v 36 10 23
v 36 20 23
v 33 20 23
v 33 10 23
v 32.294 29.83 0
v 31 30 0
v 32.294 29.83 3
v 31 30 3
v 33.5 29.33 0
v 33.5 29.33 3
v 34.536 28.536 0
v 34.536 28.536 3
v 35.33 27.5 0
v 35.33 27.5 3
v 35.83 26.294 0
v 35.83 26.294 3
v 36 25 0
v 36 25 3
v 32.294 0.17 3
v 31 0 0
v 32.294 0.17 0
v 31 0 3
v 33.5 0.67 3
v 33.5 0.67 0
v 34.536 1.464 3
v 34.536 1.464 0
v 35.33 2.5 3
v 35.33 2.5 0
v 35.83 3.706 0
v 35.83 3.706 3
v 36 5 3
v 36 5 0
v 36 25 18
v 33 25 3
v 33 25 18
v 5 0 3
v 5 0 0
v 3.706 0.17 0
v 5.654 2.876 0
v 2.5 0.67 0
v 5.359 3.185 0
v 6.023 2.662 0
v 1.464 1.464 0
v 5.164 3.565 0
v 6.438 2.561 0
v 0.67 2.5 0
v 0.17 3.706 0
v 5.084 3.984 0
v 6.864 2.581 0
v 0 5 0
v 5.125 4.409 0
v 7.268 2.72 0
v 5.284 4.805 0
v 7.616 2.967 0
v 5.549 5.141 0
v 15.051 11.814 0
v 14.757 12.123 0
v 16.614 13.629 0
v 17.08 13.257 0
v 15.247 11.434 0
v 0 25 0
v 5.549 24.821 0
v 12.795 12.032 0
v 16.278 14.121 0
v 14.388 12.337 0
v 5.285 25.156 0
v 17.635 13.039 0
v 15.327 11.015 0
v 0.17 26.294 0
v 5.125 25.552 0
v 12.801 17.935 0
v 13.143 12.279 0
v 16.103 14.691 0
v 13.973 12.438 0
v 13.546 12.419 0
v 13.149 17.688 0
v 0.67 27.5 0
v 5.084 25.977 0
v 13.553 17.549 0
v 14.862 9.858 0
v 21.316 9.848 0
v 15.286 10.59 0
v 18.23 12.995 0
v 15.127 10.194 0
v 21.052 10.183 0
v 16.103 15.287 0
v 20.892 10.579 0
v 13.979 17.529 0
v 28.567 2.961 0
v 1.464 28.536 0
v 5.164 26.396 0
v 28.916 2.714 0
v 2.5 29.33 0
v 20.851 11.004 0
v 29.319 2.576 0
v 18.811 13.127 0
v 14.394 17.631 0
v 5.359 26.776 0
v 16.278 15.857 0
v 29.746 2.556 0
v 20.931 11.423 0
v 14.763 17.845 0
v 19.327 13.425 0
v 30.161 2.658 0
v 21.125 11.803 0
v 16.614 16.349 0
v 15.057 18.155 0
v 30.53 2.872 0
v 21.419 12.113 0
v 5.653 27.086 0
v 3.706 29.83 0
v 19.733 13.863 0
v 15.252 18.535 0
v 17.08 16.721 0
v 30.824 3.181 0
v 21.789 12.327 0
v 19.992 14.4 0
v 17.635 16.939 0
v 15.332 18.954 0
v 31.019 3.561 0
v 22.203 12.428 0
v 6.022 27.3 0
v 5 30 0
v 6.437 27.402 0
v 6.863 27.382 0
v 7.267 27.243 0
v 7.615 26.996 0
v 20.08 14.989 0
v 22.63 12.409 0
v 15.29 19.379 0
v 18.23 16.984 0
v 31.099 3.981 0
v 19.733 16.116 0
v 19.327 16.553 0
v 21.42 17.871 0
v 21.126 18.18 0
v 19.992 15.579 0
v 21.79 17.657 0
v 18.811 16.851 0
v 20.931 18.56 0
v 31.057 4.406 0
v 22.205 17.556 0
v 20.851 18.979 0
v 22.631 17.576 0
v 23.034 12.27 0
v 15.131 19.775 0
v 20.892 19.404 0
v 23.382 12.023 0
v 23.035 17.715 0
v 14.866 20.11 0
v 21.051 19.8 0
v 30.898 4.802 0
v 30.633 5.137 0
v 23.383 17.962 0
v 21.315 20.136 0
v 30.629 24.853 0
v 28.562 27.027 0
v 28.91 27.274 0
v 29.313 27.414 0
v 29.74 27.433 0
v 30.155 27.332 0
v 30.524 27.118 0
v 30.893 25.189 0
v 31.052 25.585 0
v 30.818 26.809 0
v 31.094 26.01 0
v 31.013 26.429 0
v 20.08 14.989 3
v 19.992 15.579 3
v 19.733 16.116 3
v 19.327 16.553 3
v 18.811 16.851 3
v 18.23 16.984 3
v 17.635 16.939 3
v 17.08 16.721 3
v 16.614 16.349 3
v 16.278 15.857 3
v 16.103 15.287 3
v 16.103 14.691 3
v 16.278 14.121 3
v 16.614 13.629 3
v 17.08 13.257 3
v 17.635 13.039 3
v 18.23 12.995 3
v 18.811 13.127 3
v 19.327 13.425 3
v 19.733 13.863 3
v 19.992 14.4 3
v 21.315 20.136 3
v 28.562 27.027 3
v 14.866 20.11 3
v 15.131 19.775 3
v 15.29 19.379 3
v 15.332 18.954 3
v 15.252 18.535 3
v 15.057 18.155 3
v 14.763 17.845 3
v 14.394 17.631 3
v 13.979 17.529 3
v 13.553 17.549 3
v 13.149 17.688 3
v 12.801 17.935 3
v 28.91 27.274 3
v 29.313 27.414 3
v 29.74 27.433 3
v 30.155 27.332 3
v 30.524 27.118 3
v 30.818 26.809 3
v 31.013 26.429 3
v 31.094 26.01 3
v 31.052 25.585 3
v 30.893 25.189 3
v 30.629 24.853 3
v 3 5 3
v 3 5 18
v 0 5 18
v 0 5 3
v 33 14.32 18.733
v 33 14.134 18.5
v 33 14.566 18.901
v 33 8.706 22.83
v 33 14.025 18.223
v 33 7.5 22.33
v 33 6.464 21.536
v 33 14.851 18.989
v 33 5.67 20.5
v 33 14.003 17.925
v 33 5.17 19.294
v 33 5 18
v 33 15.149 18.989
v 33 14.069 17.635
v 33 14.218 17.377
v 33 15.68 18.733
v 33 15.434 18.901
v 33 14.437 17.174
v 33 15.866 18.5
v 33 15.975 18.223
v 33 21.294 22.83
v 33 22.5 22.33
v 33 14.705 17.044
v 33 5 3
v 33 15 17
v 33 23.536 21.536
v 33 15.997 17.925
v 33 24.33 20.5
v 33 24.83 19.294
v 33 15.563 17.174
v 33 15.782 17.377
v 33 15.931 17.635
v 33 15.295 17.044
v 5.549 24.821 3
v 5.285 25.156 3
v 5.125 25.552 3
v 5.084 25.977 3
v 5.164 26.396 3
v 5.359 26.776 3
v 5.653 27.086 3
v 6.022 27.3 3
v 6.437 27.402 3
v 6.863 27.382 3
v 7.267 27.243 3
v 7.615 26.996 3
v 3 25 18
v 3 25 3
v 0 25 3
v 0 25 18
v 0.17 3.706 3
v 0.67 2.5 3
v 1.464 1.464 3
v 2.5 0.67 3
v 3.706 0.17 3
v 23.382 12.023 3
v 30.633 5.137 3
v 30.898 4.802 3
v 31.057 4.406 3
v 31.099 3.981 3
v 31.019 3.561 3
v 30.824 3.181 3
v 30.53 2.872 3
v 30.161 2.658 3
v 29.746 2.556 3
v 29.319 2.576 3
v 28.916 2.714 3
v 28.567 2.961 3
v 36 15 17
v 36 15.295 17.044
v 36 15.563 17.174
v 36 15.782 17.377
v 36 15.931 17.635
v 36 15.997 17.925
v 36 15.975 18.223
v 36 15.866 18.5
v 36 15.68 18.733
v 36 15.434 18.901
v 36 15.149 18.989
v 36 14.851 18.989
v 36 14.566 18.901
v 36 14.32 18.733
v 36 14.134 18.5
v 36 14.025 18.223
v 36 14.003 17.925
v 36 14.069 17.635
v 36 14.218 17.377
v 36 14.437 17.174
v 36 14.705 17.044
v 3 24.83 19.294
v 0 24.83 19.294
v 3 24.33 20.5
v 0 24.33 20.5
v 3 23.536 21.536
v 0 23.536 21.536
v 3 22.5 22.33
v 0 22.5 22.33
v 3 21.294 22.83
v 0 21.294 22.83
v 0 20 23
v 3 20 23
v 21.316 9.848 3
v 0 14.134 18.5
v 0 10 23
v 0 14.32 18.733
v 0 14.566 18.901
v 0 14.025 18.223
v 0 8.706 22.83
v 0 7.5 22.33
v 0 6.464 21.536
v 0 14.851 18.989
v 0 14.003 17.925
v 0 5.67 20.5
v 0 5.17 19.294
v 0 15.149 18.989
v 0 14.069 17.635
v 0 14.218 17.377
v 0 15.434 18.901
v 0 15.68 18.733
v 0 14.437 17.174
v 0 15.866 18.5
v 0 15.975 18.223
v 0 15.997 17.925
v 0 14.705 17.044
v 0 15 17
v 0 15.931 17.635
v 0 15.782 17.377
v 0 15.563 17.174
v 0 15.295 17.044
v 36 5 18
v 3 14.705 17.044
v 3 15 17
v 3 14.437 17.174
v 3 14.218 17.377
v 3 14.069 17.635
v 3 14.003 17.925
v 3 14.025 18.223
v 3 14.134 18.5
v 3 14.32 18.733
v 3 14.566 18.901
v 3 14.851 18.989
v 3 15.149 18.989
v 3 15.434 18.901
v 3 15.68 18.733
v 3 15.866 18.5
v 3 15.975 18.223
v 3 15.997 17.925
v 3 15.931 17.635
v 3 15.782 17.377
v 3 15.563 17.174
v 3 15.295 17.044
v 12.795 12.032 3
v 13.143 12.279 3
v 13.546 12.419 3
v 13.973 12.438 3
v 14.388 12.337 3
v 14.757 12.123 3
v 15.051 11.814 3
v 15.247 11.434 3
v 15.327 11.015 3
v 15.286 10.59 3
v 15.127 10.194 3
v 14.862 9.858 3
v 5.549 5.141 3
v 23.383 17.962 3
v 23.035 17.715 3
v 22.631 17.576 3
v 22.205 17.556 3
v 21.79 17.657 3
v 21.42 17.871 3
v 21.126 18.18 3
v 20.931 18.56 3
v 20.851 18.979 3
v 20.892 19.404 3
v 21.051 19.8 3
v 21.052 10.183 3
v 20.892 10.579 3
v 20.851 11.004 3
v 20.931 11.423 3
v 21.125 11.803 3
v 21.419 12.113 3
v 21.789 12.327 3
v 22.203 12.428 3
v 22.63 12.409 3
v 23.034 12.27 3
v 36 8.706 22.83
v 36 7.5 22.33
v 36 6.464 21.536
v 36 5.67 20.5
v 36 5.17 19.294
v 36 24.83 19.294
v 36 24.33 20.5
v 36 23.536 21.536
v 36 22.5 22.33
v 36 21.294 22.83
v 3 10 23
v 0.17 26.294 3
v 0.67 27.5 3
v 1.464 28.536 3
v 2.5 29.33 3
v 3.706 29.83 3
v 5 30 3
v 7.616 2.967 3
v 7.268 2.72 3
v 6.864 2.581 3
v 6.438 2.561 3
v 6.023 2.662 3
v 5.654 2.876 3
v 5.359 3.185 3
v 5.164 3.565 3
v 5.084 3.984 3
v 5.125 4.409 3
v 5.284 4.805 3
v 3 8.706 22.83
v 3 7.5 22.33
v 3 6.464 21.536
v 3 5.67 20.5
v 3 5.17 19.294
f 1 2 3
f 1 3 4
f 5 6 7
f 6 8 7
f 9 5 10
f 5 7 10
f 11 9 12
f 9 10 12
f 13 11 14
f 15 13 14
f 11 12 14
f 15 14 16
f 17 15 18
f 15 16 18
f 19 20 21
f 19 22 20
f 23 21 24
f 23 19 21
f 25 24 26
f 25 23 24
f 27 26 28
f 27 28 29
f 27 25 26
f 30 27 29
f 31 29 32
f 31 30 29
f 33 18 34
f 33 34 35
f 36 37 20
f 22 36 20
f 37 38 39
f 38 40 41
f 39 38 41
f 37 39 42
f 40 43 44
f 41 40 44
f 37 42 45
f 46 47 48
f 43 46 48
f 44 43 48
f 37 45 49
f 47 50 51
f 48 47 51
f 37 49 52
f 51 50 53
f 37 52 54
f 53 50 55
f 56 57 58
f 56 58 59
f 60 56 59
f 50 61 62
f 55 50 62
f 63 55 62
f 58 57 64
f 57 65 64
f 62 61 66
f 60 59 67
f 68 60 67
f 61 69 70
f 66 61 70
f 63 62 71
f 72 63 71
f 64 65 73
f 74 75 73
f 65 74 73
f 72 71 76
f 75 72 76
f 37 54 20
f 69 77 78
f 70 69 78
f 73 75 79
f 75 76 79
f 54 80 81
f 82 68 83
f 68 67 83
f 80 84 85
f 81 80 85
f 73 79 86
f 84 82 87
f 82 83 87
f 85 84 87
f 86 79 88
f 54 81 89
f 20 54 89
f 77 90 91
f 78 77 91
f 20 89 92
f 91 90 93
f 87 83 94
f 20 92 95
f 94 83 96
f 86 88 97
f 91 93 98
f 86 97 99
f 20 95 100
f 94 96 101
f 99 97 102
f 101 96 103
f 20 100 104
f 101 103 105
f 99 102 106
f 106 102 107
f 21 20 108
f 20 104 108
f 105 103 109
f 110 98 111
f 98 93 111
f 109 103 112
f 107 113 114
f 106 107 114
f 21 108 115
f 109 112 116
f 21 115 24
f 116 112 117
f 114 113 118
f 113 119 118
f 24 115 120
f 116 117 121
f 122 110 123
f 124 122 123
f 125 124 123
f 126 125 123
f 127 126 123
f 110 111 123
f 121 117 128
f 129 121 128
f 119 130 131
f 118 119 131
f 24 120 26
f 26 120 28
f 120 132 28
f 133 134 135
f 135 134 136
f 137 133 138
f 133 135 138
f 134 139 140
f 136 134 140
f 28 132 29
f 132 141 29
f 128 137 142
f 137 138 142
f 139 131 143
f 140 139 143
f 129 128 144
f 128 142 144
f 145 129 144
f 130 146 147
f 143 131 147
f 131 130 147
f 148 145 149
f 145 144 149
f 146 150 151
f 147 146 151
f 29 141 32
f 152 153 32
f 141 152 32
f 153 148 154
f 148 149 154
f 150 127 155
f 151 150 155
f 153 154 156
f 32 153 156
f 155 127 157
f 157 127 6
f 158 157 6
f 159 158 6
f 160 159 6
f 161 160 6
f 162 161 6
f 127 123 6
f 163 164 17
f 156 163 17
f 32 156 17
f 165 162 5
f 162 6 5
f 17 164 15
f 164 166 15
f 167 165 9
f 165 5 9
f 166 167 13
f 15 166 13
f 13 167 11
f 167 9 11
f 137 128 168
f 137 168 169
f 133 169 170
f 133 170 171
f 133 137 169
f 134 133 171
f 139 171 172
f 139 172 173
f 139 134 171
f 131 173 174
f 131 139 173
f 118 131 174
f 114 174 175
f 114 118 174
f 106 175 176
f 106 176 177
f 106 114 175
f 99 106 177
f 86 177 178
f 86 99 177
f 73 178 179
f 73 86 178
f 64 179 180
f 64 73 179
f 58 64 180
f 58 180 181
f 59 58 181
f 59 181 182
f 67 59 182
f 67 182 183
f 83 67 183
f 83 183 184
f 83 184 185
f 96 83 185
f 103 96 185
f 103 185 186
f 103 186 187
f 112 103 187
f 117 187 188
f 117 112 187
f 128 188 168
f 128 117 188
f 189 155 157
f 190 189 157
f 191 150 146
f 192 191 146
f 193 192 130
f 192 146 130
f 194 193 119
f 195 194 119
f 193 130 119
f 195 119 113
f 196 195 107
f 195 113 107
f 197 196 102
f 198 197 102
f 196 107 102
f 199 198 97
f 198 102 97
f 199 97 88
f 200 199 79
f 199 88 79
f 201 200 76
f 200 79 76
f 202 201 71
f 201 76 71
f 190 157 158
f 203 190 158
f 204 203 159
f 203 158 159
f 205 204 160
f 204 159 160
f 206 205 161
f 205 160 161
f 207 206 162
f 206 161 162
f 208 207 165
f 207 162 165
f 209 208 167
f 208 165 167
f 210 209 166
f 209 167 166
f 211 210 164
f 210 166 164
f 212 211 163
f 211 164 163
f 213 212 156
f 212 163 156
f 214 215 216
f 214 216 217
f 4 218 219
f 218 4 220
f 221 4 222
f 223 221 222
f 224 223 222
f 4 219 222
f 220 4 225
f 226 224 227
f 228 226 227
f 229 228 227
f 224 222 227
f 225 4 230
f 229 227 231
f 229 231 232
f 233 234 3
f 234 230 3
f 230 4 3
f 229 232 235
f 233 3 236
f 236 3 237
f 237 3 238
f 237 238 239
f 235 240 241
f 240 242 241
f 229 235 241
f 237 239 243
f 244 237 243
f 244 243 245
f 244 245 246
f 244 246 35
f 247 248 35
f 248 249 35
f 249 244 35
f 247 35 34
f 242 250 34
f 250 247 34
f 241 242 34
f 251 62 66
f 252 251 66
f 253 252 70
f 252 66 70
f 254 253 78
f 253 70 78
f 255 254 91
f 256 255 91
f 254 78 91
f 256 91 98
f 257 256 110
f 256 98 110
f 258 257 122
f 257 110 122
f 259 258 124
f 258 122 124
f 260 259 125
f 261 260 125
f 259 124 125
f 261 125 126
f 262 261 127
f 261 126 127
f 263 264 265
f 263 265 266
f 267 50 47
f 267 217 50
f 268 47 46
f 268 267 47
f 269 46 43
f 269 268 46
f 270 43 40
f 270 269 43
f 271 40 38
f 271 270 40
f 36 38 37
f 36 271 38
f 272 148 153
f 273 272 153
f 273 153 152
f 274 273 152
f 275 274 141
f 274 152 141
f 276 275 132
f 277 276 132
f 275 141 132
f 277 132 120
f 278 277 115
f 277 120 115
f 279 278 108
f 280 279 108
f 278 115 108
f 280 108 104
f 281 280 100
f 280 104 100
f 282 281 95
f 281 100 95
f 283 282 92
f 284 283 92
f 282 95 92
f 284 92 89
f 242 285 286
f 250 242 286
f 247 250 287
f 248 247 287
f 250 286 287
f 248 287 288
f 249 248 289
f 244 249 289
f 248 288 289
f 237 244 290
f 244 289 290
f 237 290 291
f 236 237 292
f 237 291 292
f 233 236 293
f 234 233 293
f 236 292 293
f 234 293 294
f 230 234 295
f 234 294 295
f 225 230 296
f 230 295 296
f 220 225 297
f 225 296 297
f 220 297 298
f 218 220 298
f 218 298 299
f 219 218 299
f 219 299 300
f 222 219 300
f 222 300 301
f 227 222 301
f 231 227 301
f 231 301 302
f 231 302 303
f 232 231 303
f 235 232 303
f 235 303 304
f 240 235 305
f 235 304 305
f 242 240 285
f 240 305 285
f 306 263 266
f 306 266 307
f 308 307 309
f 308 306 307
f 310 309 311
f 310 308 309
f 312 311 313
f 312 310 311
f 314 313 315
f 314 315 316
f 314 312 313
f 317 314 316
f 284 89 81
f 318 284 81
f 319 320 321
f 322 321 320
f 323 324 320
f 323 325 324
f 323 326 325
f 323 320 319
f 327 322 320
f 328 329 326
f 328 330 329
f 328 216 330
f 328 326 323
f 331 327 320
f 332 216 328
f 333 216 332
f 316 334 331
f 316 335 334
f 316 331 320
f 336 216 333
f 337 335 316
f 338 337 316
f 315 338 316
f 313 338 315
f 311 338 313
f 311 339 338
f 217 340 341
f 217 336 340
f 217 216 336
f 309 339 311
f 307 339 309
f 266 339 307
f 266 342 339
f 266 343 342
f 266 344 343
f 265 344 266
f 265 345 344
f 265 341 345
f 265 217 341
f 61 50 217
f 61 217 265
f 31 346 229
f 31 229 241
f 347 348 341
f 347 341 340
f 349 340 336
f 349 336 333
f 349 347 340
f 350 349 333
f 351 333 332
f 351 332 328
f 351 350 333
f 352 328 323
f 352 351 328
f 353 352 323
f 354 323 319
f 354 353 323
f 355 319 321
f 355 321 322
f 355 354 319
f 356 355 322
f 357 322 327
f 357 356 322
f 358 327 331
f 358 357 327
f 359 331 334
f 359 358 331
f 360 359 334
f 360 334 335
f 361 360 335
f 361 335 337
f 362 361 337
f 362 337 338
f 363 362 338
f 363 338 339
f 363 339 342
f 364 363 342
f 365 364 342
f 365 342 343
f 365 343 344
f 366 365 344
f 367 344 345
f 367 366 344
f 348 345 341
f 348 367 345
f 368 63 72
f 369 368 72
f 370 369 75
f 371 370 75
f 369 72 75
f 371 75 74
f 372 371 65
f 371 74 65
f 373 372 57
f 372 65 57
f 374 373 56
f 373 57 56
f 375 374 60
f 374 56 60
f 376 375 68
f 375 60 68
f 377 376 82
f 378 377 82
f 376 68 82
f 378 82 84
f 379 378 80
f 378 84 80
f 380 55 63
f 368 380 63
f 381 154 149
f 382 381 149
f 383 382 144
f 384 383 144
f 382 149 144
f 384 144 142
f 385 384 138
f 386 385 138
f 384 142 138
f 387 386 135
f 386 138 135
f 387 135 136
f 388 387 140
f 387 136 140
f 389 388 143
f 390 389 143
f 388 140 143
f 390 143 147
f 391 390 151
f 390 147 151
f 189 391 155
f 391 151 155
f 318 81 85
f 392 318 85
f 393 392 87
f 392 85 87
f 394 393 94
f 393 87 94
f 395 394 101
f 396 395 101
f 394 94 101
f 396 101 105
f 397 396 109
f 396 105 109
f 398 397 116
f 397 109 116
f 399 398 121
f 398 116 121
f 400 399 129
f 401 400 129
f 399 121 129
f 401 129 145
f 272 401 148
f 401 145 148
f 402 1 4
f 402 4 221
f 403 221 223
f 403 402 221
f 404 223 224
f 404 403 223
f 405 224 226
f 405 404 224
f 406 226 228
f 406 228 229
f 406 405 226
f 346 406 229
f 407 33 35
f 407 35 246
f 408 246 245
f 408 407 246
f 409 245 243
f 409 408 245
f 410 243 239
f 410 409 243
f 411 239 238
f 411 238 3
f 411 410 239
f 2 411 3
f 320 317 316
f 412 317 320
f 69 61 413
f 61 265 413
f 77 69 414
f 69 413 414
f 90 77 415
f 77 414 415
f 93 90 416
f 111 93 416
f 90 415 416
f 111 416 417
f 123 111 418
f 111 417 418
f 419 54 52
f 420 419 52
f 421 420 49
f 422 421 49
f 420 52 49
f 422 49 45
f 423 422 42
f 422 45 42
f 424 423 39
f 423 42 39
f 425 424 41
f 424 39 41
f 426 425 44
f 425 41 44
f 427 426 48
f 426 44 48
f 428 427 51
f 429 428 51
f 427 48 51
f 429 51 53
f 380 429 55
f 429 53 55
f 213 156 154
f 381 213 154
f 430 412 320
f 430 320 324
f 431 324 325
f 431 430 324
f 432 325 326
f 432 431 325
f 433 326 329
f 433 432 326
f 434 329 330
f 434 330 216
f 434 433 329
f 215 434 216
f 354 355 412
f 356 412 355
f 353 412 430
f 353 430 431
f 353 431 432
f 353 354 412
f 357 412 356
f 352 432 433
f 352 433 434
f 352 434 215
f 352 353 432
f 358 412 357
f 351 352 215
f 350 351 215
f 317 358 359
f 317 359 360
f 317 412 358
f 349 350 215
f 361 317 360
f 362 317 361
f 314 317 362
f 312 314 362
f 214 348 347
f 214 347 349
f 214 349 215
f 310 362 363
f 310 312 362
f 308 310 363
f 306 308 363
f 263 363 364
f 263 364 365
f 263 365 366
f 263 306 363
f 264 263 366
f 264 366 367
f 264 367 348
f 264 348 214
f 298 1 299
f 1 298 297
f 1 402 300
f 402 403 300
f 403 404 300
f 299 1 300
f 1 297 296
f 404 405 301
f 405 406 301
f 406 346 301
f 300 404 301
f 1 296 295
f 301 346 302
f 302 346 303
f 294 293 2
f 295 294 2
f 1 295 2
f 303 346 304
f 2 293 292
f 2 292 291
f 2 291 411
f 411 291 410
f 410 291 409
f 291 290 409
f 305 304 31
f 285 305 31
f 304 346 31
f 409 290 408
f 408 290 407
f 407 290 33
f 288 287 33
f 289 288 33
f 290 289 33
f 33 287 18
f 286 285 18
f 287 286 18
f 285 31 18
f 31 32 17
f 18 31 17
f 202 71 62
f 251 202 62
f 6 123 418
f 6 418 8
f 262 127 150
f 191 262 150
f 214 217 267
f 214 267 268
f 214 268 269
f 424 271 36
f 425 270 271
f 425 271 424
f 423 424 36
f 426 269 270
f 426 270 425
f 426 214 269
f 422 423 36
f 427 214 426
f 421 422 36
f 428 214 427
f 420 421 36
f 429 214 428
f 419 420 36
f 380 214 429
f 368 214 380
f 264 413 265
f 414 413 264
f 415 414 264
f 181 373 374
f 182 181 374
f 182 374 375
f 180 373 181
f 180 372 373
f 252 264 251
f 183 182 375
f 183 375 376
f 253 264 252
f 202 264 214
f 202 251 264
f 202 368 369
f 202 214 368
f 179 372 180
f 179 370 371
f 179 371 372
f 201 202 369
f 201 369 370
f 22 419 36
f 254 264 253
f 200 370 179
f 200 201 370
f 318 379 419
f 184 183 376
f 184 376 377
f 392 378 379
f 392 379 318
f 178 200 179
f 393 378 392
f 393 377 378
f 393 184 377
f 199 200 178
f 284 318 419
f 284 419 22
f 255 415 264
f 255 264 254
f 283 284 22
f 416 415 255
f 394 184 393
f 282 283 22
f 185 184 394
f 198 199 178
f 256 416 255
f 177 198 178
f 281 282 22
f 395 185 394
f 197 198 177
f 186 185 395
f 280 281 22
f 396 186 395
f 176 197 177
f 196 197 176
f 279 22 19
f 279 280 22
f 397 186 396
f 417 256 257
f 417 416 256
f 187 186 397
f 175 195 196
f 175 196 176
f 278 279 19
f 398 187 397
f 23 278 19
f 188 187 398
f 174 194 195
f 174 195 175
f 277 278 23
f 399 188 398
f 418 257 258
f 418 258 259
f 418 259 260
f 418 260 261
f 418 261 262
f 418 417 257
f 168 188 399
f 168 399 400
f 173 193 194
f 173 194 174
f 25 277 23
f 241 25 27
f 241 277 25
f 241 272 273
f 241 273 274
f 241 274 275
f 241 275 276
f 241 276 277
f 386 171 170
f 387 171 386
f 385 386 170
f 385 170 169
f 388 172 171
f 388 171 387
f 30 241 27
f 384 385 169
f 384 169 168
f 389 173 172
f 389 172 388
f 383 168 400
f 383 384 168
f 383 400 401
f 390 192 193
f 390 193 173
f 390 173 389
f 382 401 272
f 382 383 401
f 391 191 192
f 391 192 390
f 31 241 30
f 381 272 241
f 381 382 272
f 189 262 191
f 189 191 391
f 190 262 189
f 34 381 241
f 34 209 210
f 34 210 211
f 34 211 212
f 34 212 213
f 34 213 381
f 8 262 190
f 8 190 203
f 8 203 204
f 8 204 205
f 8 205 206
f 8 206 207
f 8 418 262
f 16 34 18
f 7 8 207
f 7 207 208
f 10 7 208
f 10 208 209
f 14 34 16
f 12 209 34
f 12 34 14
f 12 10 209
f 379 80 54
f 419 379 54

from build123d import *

# Parameters (mm, degrees)
SKETCH1_W           = 36
SKETCH1_H           = 30
SKETCH1_R           = 2
BOSS_EXTRUDE2_DEPTH = 3
SKETCH2_R           = 1
BOSS_EXTRUDE3_DEPTH = 3
BOSS_EXTRUDE4_START = -3
SKETCH3_R           = 1
BOSS_EXTRUDE4_DEPTH = 3
FILLET1_R           = 5


with BuildPart() as part:
    # Sketch1 → Boss-Extrude2 (new body)
    with BuildSketch(Plane.XY):
        with Locations((18, 15)):
            Rectangle(SKETCH1_W, SKETCH1_H)
        with Locations((18.080429635, 14.989140404)):
            Circle(SKETCH1_R, mode=Mode.SUBTRACT)
        with BuildLine():
            Line((30.628958922, 24.853393036), (23.382773138, 17.961891633))
            ThreePointArc((23.382773138, 17.961891633), (21.26212006, 18.01509429), (21.315322717, 20.135747368))
            Line((21.315322717, 20.135747368), (28.561508501, 27.027248771))
            ThreePointArc((28.561508501, 27.027248771), (30.682161579, 26.974046114), (30.628958922, 24.853393036))
        make_face(mode=Mode.SUBTRACT)
        with BuildLine():
            Line((23.38198698, 12.023010255), (30.633153673, 5.136749906))
            ThreePointArc((30.633153673, 5.136749906), (30.687889624, 3.016135849), (28.567275568, 2.961399898))
            Line((28.567275568, 2.961399898), (21.316108876, 9.847660248))
            ThreePointArc((21.316108876, 9.847660248), (21.261372924, 11.968274304), (23.38198698, 12.023010255))
        make_face(mode=Mode.SUBTRACT)
        with BuildLine():
            Line((14.862197308, 9.858378688), (7.616011524, 2.966877285))
            ThreePointArc((7.616011524, 2.966877285), (5.495358446, 3.020079942), (5.548561103, 5.14073302))
            Line((5.548561103, 5.14073302), (12.794746887, 12.032234423))
            ThreePointArc((12.794746887, 12.032234423), (14.915399965, 11.979031766), (14.862197308, 9.858378688))
        make_face(mode=Mode.SUBTRACT)
        with BuildLine():
            Line((7.615225366, 26.996328337), (14.866392058, 20.110067987))
            ThreePointArc((14.866392058, 20.110067987), (14.92112801, 17.989453931), (12.800513954, 17.934717979))
            Line((12.800513954, 17.934717979), (5.549347261, 24.820978329))
            ThreePointArc((5.549347261, 24.820978329), (5.49461131, 26.941592385), (7.615225366, 26.996328337))
        make_face(mode=Mode.SUBTRACT)
    extrude(amount=BOSS_EXTRUDE2_DEPTH)

    # Sketch2 → Boss-Extrude3 (add)
    with BuildSketch(Plane(origin=(36, 0, 0), x_dir=(0, 0, -1), z_dir=(1, 0, 0))):
        with BuildLine():
            Line((-18, 5), (-3, 5))
            Line((-3, 5), (-3, 25))
            Line((-3, 25), (-18, 25))
            ThreePointArc((-18, 25), (-21.535533906, 23.535533906), (-23, 20))
            Line((-23, 20), (-23, 10))
            ThreePointArc((-23, 10), (-21.535533906, 6.464466094), (-18, 5))
        make_face()
        with Locations((-18, 15)):
            Circle(SKETCH2_R, mode=Mode.SUBTRACT)
    extrude(amount=-BOSS_EXTRUDE3_DEPTH)

    # Sketch3 → Boss-Extrude4 (add)
    with BuildSketch(Plane.ZY.offset(BOSS_EXTRUDE4_START)):
        with BuildLine():
            Line((3, 25), (18, 25))
            ThreePointArc((18, 25), (21.535533906, 23.535533906), (23, 20))
            Line((23, 20), (23, 10))
            ThreePointArc((23, 10), (21.535533906, 6.464466094), (18, 5))
            Line((18, 5), (3, 5))
            Line((3, 5), (3, 25))
        make_face()
        with Locations(Location((18, 15, 0), (0, 0, 180))):
            Circle(SKETCH3_R, mode=Mode.SUBTRACT)
    extrude(amount=BOSS_EXTRUDE4_DEPTH)

    # Fillet1
    fillet1_edges = [part.edges().sort_by_distance(p)[0] for p in [
        (36, 30, 1.5),
        (0, 30, 1.5),
        (0, 0, 1.5),
        (36, 0, 1.5),
    ]]
    fillet(fillet1_edges, radius=FILLET1_R)


solid = part.part
